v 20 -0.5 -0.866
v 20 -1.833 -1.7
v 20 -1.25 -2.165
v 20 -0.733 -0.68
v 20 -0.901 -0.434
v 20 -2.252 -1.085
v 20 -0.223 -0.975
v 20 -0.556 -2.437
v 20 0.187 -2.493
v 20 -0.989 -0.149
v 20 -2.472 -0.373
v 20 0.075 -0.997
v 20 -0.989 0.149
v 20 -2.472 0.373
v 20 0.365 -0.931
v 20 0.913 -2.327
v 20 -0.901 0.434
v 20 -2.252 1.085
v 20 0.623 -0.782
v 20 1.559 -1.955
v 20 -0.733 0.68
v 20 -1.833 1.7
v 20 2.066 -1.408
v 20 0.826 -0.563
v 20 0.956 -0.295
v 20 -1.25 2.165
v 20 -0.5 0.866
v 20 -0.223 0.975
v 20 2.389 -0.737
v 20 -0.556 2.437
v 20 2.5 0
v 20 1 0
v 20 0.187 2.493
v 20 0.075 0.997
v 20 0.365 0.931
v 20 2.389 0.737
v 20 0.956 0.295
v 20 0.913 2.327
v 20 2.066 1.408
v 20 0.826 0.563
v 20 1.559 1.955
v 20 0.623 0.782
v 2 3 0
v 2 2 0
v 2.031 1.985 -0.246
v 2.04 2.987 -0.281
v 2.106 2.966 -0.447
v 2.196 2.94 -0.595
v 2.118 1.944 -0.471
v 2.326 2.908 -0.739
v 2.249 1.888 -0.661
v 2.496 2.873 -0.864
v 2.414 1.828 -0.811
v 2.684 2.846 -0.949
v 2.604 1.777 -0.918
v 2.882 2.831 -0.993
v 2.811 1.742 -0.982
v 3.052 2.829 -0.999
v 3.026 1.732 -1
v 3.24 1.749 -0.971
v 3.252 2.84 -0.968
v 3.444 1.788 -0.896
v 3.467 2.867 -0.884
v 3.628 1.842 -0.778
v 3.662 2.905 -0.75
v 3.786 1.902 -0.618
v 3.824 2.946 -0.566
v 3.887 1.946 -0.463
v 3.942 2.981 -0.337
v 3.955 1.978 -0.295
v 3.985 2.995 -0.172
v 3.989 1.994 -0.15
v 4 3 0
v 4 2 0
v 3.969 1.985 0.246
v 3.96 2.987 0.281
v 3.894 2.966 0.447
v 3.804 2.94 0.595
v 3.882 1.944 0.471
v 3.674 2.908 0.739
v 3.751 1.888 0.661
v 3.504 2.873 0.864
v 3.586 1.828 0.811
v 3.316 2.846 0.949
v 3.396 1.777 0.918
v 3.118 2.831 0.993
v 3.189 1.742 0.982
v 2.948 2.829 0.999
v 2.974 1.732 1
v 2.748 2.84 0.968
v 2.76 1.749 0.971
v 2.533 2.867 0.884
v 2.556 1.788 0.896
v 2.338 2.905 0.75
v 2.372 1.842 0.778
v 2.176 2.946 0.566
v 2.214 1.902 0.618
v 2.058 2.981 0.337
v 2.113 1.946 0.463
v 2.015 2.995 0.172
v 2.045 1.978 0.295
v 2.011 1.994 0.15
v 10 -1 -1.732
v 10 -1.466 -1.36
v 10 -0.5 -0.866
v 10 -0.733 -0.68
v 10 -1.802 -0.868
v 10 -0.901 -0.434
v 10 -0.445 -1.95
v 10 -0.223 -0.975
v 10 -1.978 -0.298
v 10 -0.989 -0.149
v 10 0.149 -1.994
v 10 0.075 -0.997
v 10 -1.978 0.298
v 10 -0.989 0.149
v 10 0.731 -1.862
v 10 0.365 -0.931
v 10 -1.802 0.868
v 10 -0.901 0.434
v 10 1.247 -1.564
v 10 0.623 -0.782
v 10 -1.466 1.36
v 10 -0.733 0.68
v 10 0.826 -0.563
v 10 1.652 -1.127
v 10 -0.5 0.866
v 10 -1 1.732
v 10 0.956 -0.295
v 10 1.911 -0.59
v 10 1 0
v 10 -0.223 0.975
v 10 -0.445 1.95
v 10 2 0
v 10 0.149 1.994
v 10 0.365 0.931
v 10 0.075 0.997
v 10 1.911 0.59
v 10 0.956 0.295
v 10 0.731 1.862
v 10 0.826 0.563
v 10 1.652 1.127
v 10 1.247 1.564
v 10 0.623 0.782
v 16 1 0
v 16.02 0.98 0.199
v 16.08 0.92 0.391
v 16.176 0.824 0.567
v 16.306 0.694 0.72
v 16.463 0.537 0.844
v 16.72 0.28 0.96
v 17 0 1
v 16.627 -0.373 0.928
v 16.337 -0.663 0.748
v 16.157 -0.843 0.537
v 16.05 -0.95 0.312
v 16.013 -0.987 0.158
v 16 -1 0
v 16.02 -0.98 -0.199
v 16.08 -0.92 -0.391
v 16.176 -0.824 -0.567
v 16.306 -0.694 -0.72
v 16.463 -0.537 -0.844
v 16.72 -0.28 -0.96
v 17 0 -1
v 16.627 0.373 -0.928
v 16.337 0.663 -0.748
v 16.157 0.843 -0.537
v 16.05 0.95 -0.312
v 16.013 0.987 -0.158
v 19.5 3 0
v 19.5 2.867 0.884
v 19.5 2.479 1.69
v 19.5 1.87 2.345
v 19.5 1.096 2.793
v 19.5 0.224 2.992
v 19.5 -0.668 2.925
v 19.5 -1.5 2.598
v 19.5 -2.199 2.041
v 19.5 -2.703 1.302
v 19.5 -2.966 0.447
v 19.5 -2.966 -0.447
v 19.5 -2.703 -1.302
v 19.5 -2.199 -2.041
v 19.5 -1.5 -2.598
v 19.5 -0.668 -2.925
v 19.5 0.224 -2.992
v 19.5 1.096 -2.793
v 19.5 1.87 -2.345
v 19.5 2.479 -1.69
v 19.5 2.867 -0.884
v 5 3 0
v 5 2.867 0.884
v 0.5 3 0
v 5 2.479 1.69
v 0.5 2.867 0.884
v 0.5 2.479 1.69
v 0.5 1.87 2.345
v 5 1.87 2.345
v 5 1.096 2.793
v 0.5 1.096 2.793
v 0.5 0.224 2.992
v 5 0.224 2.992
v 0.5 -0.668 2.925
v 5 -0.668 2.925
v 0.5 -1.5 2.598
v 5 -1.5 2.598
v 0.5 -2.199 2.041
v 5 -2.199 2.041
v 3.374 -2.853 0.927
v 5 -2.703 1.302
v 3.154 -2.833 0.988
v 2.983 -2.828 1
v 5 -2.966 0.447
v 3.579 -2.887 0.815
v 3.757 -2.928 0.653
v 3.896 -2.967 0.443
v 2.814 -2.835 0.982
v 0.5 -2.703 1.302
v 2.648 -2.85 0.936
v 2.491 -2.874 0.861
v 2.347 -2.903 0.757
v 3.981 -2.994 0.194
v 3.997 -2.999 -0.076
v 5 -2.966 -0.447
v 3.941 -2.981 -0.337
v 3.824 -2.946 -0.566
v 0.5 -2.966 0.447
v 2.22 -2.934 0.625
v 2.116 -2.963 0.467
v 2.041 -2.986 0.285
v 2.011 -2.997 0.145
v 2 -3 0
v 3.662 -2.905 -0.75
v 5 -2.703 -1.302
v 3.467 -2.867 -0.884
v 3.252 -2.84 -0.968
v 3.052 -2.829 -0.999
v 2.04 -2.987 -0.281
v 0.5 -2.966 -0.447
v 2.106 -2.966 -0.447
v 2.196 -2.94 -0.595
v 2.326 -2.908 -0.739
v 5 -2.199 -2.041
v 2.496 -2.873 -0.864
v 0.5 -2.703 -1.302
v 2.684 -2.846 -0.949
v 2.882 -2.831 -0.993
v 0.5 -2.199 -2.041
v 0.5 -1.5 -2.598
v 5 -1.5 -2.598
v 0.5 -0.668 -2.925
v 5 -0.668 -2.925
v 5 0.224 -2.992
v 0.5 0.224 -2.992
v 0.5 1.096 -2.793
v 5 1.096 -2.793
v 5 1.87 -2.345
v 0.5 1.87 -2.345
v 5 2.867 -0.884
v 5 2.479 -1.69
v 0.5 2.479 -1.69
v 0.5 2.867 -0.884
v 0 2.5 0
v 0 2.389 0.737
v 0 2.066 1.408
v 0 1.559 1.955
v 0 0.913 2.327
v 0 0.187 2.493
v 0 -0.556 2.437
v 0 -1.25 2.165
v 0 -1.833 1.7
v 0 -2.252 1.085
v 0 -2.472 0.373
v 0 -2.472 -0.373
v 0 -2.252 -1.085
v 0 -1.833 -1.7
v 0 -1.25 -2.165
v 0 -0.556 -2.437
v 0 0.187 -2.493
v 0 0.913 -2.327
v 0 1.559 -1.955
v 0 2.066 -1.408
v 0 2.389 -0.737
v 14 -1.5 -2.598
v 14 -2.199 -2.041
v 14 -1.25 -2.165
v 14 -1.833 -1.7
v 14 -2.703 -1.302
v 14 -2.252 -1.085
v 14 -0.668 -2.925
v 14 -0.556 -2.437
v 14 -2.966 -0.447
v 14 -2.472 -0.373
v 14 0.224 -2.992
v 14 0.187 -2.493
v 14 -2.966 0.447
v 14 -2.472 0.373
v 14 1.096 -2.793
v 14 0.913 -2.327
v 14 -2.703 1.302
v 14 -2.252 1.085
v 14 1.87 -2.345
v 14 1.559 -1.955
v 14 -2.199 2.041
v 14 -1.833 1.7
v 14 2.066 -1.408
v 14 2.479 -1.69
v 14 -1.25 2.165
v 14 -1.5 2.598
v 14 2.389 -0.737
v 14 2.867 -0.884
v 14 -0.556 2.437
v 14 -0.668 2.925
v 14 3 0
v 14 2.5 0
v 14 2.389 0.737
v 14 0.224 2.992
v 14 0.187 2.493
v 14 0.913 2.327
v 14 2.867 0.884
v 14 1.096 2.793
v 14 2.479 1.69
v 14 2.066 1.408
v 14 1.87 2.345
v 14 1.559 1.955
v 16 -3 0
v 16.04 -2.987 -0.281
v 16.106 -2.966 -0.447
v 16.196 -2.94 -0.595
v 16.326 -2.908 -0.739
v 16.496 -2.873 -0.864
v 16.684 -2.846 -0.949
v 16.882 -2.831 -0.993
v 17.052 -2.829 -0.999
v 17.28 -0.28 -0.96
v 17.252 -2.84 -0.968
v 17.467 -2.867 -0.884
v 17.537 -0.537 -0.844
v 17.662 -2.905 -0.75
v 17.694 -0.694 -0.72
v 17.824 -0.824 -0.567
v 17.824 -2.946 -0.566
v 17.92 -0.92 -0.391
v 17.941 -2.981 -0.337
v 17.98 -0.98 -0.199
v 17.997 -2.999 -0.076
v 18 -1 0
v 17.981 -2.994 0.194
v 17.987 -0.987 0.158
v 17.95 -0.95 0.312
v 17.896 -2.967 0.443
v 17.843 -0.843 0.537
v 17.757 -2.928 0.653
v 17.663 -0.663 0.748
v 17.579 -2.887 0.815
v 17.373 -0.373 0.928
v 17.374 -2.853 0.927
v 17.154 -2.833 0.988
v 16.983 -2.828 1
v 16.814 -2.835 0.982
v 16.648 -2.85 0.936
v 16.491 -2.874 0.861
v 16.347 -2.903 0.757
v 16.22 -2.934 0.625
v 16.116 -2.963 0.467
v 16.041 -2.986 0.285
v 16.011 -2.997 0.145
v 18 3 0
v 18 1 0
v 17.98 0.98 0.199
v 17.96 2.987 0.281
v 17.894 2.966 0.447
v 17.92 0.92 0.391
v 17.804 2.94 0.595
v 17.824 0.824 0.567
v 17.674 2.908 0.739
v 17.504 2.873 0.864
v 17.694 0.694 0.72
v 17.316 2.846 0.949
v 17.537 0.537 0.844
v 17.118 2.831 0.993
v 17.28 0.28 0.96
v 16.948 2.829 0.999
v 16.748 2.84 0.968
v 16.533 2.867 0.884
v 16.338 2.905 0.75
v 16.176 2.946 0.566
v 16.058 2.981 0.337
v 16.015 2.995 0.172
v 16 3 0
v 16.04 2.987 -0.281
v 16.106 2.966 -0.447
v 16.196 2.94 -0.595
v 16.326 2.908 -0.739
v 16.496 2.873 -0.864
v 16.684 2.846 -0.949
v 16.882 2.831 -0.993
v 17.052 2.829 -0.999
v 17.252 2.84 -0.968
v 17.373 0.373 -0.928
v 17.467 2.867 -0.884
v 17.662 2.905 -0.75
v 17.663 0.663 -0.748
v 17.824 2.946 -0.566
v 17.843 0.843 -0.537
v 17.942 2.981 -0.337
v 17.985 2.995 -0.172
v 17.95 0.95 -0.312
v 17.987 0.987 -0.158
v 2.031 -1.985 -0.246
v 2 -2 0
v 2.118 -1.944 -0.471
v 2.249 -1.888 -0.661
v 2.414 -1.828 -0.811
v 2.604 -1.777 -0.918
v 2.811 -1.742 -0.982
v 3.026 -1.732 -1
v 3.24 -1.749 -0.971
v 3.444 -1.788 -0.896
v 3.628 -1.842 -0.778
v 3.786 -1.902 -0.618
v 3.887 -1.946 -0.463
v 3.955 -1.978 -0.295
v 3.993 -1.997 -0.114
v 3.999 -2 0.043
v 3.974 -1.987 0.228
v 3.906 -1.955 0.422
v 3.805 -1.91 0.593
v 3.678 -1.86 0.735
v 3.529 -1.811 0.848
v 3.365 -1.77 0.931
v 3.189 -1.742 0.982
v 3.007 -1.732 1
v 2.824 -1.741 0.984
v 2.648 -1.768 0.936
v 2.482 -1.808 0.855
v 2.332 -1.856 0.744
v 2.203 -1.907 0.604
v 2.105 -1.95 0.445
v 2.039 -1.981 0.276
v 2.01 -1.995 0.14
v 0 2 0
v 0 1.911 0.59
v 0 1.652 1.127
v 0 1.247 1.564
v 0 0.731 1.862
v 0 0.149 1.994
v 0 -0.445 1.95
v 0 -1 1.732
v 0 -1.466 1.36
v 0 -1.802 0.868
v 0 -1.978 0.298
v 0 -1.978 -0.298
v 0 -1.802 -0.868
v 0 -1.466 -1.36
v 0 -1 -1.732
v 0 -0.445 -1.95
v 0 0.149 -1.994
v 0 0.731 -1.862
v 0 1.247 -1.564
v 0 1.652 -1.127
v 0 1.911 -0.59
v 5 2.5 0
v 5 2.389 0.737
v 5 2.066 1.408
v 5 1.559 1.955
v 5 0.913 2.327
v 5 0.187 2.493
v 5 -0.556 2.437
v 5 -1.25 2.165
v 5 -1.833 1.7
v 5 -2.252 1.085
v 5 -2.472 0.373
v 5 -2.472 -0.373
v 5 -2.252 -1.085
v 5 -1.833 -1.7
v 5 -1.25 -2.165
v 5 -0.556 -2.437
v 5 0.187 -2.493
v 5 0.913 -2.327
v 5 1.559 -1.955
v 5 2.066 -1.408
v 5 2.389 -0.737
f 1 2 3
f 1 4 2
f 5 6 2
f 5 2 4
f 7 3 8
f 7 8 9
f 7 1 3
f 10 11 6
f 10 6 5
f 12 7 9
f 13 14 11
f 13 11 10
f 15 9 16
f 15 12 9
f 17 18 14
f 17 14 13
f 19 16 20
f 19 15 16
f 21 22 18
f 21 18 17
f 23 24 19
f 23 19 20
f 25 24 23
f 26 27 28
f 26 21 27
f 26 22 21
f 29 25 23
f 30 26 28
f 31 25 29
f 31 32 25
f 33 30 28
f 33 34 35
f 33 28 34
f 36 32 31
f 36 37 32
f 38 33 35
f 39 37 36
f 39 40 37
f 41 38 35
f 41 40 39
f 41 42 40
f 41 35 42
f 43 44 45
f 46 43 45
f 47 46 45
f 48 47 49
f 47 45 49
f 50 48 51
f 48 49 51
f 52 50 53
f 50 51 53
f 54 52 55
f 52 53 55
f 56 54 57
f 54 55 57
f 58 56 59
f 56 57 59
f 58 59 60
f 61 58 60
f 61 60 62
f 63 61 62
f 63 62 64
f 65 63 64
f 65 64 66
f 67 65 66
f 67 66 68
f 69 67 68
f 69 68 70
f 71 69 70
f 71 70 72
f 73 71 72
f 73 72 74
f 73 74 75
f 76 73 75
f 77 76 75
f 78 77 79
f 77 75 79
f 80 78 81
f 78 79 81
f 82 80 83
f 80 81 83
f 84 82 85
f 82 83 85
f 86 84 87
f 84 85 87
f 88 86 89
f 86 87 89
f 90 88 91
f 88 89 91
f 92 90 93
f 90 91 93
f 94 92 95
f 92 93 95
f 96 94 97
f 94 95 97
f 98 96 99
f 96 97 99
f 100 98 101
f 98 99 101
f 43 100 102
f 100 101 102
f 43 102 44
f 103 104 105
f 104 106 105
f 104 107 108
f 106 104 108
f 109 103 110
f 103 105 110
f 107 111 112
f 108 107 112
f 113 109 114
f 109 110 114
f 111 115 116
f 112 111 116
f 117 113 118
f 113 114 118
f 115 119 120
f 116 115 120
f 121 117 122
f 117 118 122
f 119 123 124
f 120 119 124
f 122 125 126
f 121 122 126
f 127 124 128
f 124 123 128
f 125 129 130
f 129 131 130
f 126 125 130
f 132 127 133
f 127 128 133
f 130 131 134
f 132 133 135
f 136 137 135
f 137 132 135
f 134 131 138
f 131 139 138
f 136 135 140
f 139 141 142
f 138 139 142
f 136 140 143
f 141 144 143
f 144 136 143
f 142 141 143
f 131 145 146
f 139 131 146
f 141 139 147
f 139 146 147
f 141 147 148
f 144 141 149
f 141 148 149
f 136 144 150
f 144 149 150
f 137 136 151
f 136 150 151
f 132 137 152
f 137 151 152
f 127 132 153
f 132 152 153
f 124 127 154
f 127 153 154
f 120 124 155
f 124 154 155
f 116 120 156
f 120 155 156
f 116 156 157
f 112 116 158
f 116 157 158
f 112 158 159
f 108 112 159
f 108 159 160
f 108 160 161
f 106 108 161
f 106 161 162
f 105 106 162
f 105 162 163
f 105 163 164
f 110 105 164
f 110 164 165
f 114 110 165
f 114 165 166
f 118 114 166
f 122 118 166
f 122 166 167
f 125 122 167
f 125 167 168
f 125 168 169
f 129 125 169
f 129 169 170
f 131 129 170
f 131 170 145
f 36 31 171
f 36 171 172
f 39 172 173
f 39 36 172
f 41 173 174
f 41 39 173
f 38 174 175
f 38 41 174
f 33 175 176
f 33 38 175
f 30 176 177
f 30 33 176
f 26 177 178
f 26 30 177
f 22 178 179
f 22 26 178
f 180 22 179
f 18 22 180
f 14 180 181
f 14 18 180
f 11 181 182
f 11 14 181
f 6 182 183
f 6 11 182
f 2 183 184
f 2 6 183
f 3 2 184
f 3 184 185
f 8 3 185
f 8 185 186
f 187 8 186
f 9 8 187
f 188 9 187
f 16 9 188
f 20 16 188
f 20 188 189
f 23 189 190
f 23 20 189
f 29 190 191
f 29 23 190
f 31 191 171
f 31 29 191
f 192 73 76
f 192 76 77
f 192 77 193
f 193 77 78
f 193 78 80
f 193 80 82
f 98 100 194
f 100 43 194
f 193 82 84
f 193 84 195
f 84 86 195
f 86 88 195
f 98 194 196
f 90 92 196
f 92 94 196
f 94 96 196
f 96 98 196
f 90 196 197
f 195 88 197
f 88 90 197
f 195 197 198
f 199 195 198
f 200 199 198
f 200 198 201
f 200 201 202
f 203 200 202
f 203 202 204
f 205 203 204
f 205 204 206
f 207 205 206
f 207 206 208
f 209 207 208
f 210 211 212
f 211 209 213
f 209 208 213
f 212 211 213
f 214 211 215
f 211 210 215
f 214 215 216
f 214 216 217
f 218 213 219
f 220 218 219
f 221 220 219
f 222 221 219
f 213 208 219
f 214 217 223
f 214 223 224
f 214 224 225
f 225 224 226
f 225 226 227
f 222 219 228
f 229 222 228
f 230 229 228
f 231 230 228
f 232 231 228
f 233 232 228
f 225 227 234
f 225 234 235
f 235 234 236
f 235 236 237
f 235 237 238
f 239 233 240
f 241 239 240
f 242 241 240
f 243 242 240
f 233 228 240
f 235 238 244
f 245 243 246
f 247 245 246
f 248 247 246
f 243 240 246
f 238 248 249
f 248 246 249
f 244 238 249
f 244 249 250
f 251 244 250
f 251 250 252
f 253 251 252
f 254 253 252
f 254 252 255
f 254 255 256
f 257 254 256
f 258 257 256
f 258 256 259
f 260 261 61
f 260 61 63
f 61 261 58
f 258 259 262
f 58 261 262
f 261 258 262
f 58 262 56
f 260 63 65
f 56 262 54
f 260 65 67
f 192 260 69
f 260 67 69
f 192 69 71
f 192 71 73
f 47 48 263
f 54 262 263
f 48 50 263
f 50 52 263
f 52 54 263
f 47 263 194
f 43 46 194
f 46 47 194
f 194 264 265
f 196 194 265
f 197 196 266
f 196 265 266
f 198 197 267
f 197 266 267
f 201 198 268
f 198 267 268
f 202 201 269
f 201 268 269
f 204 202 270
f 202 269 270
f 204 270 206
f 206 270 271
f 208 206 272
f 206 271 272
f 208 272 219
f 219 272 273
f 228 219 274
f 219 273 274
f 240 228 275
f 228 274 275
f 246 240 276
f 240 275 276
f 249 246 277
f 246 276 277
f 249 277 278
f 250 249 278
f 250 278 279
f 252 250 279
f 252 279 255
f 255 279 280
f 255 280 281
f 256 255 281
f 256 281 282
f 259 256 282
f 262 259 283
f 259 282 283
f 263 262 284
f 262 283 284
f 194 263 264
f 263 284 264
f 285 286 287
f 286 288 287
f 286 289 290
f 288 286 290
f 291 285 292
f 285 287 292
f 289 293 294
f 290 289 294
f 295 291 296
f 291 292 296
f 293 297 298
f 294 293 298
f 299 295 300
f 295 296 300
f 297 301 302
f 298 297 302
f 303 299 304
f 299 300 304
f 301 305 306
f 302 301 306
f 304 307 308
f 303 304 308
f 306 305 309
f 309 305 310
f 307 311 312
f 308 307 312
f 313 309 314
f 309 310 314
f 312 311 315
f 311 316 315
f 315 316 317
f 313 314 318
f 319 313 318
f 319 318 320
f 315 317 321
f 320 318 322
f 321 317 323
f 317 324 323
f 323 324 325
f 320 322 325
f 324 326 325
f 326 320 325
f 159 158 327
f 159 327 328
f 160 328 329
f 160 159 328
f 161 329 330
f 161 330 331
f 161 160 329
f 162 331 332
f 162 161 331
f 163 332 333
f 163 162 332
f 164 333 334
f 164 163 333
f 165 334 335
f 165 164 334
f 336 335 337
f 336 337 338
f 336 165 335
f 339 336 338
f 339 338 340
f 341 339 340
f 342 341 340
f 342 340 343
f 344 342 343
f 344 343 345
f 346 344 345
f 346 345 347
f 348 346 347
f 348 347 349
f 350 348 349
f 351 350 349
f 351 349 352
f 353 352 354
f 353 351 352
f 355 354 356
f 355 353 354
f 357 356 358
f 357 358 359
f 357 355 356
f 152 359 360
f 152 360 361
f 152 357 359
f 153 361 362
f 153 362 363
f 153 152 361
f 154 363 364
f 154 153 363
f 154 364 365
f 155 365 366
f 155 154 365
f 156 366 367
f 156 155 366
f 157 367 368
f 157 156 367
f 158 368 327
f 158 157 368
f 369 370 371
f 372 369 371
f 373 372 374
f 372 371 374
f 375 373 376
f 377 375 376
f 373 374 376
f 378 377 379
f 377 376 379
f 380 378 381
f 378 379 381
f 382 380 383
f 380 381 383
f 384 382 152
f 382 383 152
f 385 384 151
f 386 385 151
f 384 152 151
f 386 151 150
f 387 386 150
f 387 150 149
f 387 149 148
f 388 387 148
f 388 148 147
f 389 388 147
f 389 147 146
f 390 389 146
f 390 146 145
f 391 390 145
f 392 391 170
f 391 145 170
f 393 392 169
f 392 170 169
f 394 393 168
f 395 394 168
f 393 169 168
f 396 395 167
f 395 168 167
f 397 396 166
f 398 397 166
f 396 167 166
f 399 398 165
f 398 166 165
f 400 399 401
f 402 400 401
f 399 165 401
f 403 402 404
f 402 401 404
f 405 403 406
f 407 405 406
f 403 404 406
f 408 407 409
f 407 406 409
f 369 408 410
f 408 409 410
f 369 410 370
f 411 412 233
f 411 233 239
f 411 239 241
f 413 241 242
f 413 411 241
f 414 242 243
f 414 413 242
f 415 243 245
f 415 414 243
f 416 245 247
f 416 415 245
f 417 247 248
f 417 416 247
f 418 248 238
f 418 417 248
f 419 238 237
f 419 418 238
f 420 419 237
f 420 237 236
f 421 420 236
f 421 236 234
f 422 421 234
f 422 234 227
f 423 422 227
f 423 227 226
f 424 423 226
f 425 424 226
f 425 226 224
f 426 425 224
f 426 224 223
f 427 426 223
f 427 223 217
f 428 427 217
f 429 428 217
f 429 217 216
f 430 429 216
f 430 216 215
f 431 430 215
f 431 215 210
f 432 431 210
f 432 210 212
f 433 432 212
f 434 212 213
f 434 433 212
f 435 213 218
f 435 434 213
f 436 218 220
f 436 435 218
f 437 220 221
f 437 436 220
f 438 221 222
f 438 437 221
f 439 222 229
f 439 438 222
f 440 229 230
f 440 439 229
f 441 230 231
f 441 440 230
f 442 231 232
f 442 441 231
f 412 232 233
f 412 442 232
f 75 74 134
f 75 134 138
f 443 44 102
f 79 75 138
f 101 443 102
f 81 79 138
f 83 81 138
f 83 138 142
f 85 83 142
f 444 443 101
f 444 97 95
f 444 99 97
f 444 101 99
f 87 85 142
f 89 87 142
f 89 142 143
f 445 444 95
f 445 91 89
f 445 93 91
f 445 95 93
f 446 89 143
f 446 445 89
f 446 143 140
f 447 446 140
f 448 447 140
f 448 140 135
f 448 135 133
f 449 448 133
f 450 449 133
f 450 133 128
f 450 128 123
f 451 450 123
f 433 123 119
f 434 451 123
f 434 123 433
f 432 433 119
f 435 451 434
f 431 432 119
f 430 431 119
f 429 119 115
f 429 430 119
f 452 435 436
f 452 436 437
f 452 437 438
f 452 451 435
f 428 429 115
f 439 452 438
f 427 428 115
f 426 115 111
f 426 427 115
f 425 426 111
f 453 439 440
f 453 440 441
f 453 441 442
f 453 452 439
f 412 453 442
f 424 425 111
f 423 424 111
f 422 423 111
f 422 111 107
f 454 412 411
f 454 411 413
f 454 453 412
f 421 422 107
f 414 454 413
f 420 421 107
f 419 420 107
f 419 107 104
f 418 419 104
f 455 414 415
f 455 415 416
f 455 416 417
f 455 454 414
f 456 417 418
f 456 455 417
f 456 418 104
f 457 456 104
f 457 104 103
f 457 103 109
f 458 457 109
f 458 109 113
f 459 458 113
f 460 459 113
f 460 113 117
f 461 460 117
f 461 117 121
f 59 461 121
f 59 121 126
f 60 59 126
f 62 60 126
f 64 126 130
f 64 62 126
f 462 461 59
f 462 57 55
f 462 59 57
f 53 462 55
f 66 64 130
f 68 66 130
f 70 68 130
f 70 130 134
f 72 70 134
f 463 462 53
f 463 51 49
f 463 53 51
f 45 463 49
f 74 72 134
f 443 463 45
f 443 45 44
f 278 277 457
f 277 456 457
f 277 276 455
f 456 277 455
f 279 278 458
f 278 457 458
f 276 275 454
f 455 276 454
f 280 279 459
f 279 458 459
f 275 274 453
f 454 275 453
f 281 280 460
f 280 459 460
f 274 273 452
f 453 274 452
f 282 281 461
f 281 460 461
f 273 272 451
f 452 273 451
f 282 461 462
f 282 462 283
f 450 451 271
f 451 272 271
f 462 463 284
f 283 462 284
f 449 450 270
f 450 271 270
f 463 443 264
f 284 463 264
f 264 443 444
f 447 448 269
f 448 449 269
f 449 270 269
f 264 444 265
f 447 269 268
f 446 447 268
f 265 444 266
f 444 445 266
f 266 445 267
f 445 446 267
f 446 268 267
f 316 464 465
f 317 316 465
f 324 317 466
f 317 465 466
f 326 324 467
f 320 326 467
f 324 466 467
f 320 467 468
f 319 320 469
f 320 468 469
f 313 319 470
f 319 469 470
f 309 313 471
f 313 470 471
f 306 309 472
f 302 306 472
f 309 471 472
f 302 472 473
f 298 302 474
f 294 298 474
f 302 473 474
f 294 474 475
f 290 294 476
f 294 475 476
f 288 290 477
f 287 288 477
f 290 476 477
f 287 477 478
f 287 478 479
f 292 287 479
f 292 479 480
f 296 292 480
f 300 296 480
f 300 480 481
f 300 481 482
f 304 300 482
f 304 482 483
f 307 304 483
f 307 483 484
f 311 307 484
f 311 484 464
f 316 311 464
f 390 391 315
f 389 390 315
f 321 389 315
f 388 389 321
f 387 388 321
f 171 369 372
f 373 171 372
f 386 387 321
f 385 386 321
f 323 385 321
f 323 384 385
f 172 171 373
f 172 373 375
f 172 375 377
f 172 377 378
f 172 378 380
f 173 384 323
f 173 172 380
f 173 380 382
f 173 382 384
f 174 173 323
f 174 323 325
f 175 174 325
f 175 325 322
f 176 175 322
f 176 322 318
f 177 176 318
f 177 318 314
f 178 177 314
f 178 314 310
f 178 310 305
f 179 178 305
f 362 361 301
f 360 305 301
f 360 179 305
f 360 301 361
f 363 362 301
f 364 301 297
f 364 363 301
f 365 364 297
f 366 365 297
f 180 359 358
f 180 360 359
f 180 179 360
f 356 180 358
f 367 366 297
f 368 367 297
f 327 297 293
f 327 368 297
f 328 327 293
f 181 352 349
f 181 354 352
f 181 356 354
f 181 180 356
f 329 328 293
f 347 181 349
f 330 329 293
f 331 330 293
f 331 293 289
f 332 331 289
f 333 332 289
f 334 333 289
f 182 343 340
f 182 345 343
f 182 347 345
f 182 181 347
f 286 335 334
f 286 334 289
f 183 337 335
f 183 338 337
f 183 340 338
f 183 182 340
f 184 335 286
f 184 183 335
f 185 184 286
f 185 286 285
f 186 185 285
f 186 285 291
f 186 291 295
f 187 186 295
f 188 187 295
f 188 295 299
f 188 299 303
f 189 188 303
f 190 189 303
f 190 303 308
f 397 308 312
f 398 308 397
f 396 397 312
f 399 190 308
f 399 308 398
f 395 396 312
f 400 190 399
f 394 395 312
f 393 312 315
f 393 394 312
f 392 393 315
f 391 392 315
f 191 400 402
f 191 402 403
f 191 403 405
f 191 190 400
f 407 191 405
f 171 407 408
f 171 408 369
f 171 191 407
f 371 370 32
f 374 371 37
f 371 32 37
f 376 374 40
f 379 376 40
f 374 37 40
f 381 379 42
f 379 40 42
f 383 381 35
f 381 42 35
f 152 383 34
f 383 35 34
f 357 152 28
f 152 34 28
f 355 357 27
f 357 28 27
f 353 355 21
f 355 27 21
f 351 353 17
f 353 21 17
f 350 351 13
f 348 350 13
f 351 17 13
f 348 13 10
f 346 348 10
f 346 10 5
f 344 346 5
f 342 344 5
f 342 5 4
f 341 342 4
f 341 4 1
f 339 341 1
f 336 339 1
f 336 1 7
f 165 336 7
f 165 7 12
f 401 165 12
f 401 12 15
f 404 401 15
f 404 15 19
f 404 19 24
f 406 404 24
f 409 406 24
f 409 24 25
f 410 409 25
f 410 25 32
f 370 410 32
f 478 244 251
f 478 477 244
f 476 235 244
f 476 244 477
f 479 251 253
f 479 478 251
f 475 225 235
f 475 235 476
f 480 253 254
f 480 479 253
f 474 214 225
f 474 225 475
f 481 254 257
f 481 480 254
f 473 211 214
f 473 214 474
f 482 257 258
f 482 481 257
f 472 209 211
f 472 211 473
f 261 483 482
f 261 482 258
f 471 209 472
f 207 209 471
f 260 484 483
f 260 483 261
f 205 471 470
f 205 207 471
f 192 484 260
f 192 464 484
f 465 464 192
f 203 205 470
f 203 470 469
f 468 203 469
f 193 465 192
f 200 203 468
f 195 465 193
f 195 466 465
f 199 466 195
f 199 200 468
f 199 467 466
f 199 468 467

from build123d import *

# Parameters (mm, degrees)
F0_R      = 2.5
F0_R_2    = 2
F1_DEPTH  = 20
F0_R_3    = 3
F2_DEPTH  = 5
F3_DEPTH  = 10
F4_R      = 3
F4_R_2    = 2.5
F5_DEPTH  = 6
F4_R_3    = 1
F6_DEPTH  = 10
F7_SIZE   = 0.5
F9_DEPTH  = 25
F10_DEPTH = 25


with BuildPart() as f1:
    # F0 (on Right) → F1 (new body)
    with BuildSketch(Plane.YZ):
        Circle(F0_R)
        Circle(F0_R_2, mode=Mode.SUBTRACT)
        Circle(F0_R_2)
    extrude(amount=F1_DEPTH)

    # F0 (on Right) → F2 (join)
    with BuildSketch(Plane.YZ):
        Circle(F0_R_3)
        Circle(F0_R, mode=Mode.SUBTRACT)
    extrude(amount=F2_DEPTH)

    # F0 (on Right) → F3 (cut)
    with BuildSketch(Plane.YZ):
        Circle(F0_R_2)
    extrude(amount=F3_DEPTH, mode=Mode.SUBTRACT)

    # F4 (on face) → F5 (join)
    with BuildSketch(Plane.YZ.offset(20)):
        Circle(F4_R)
        Circle(F4_R_2, mode=Mode.SUBTRACT)
    extrude(amount=-F5_DEPTH)

    # F4 (on face) → F6 (cut)
    with BuildSketch(Plane.YZ.offset(20)):
        Circle(F4_R_3)
    extrude(amount=-F6_DEPTH, mode=Mode.SUBTRACT)

    # F7
    f7_edges = [f1.edges().sort_by_distance(p)[0] for p in [
        (20, -3, 0),
        (0, -3, 0),
    ]]
    chamfer(f7_edges, length=F7_SIZE)

    # F8 (on Front) → F9 (cut)
    with BuildSketch(Plane.XZ):
        with BuildLine():
            ThreePointArc((4, 0), (3, 1), (2, 0))
            Line((2, 0), (4, 0))
        make_face()
        with BuildLine():
            Line((4, 0), (2, 0))
            ThreePointArc((2, 0), (3, -1), (4, 0))
        make_face()
        with BuildLine():
            Line((18, 0), (16, 0))
            ThreePointArc((16, 0), (17, -1), (18, 0))
        make_face()
        with BuildLine():
            ThreePointArc((18, 0), (17, 1), (16, 0))
            Line((16, 0), (18, 0))
        make_face()
    extrude(amount=-F9_DEPTH, mode=Mode.SUBTRACT)

    # F8 (on Front) → F10 (cut)
    with BuildSketch(Plane.XZ):
        with BuildLine():
            ThreePointArc((18, 0), (17, 1), (16, 0))
            Line((16, 0), (18, 0))
        make_face()
        with BuildLine():
            Line((18, 0), (16, 0))
            ThreePointArc((16, 0), (17, -1), (18, 0))
        make_face()
        with BuildLine():
            ThreePointArc((4, 0), (3, 1), (2, 0))
            Line((2, 0), (4, 0))
        make_face()
        with BuildLine():
            Line((4, 0), (2, 0))
            ThreePointArc((2, 0), (3, -1), (4, 0))
        make_face()
    extrude(amount=F10_DEPTH, mode=Mode.SUBTRACT)


solid = f1.part
